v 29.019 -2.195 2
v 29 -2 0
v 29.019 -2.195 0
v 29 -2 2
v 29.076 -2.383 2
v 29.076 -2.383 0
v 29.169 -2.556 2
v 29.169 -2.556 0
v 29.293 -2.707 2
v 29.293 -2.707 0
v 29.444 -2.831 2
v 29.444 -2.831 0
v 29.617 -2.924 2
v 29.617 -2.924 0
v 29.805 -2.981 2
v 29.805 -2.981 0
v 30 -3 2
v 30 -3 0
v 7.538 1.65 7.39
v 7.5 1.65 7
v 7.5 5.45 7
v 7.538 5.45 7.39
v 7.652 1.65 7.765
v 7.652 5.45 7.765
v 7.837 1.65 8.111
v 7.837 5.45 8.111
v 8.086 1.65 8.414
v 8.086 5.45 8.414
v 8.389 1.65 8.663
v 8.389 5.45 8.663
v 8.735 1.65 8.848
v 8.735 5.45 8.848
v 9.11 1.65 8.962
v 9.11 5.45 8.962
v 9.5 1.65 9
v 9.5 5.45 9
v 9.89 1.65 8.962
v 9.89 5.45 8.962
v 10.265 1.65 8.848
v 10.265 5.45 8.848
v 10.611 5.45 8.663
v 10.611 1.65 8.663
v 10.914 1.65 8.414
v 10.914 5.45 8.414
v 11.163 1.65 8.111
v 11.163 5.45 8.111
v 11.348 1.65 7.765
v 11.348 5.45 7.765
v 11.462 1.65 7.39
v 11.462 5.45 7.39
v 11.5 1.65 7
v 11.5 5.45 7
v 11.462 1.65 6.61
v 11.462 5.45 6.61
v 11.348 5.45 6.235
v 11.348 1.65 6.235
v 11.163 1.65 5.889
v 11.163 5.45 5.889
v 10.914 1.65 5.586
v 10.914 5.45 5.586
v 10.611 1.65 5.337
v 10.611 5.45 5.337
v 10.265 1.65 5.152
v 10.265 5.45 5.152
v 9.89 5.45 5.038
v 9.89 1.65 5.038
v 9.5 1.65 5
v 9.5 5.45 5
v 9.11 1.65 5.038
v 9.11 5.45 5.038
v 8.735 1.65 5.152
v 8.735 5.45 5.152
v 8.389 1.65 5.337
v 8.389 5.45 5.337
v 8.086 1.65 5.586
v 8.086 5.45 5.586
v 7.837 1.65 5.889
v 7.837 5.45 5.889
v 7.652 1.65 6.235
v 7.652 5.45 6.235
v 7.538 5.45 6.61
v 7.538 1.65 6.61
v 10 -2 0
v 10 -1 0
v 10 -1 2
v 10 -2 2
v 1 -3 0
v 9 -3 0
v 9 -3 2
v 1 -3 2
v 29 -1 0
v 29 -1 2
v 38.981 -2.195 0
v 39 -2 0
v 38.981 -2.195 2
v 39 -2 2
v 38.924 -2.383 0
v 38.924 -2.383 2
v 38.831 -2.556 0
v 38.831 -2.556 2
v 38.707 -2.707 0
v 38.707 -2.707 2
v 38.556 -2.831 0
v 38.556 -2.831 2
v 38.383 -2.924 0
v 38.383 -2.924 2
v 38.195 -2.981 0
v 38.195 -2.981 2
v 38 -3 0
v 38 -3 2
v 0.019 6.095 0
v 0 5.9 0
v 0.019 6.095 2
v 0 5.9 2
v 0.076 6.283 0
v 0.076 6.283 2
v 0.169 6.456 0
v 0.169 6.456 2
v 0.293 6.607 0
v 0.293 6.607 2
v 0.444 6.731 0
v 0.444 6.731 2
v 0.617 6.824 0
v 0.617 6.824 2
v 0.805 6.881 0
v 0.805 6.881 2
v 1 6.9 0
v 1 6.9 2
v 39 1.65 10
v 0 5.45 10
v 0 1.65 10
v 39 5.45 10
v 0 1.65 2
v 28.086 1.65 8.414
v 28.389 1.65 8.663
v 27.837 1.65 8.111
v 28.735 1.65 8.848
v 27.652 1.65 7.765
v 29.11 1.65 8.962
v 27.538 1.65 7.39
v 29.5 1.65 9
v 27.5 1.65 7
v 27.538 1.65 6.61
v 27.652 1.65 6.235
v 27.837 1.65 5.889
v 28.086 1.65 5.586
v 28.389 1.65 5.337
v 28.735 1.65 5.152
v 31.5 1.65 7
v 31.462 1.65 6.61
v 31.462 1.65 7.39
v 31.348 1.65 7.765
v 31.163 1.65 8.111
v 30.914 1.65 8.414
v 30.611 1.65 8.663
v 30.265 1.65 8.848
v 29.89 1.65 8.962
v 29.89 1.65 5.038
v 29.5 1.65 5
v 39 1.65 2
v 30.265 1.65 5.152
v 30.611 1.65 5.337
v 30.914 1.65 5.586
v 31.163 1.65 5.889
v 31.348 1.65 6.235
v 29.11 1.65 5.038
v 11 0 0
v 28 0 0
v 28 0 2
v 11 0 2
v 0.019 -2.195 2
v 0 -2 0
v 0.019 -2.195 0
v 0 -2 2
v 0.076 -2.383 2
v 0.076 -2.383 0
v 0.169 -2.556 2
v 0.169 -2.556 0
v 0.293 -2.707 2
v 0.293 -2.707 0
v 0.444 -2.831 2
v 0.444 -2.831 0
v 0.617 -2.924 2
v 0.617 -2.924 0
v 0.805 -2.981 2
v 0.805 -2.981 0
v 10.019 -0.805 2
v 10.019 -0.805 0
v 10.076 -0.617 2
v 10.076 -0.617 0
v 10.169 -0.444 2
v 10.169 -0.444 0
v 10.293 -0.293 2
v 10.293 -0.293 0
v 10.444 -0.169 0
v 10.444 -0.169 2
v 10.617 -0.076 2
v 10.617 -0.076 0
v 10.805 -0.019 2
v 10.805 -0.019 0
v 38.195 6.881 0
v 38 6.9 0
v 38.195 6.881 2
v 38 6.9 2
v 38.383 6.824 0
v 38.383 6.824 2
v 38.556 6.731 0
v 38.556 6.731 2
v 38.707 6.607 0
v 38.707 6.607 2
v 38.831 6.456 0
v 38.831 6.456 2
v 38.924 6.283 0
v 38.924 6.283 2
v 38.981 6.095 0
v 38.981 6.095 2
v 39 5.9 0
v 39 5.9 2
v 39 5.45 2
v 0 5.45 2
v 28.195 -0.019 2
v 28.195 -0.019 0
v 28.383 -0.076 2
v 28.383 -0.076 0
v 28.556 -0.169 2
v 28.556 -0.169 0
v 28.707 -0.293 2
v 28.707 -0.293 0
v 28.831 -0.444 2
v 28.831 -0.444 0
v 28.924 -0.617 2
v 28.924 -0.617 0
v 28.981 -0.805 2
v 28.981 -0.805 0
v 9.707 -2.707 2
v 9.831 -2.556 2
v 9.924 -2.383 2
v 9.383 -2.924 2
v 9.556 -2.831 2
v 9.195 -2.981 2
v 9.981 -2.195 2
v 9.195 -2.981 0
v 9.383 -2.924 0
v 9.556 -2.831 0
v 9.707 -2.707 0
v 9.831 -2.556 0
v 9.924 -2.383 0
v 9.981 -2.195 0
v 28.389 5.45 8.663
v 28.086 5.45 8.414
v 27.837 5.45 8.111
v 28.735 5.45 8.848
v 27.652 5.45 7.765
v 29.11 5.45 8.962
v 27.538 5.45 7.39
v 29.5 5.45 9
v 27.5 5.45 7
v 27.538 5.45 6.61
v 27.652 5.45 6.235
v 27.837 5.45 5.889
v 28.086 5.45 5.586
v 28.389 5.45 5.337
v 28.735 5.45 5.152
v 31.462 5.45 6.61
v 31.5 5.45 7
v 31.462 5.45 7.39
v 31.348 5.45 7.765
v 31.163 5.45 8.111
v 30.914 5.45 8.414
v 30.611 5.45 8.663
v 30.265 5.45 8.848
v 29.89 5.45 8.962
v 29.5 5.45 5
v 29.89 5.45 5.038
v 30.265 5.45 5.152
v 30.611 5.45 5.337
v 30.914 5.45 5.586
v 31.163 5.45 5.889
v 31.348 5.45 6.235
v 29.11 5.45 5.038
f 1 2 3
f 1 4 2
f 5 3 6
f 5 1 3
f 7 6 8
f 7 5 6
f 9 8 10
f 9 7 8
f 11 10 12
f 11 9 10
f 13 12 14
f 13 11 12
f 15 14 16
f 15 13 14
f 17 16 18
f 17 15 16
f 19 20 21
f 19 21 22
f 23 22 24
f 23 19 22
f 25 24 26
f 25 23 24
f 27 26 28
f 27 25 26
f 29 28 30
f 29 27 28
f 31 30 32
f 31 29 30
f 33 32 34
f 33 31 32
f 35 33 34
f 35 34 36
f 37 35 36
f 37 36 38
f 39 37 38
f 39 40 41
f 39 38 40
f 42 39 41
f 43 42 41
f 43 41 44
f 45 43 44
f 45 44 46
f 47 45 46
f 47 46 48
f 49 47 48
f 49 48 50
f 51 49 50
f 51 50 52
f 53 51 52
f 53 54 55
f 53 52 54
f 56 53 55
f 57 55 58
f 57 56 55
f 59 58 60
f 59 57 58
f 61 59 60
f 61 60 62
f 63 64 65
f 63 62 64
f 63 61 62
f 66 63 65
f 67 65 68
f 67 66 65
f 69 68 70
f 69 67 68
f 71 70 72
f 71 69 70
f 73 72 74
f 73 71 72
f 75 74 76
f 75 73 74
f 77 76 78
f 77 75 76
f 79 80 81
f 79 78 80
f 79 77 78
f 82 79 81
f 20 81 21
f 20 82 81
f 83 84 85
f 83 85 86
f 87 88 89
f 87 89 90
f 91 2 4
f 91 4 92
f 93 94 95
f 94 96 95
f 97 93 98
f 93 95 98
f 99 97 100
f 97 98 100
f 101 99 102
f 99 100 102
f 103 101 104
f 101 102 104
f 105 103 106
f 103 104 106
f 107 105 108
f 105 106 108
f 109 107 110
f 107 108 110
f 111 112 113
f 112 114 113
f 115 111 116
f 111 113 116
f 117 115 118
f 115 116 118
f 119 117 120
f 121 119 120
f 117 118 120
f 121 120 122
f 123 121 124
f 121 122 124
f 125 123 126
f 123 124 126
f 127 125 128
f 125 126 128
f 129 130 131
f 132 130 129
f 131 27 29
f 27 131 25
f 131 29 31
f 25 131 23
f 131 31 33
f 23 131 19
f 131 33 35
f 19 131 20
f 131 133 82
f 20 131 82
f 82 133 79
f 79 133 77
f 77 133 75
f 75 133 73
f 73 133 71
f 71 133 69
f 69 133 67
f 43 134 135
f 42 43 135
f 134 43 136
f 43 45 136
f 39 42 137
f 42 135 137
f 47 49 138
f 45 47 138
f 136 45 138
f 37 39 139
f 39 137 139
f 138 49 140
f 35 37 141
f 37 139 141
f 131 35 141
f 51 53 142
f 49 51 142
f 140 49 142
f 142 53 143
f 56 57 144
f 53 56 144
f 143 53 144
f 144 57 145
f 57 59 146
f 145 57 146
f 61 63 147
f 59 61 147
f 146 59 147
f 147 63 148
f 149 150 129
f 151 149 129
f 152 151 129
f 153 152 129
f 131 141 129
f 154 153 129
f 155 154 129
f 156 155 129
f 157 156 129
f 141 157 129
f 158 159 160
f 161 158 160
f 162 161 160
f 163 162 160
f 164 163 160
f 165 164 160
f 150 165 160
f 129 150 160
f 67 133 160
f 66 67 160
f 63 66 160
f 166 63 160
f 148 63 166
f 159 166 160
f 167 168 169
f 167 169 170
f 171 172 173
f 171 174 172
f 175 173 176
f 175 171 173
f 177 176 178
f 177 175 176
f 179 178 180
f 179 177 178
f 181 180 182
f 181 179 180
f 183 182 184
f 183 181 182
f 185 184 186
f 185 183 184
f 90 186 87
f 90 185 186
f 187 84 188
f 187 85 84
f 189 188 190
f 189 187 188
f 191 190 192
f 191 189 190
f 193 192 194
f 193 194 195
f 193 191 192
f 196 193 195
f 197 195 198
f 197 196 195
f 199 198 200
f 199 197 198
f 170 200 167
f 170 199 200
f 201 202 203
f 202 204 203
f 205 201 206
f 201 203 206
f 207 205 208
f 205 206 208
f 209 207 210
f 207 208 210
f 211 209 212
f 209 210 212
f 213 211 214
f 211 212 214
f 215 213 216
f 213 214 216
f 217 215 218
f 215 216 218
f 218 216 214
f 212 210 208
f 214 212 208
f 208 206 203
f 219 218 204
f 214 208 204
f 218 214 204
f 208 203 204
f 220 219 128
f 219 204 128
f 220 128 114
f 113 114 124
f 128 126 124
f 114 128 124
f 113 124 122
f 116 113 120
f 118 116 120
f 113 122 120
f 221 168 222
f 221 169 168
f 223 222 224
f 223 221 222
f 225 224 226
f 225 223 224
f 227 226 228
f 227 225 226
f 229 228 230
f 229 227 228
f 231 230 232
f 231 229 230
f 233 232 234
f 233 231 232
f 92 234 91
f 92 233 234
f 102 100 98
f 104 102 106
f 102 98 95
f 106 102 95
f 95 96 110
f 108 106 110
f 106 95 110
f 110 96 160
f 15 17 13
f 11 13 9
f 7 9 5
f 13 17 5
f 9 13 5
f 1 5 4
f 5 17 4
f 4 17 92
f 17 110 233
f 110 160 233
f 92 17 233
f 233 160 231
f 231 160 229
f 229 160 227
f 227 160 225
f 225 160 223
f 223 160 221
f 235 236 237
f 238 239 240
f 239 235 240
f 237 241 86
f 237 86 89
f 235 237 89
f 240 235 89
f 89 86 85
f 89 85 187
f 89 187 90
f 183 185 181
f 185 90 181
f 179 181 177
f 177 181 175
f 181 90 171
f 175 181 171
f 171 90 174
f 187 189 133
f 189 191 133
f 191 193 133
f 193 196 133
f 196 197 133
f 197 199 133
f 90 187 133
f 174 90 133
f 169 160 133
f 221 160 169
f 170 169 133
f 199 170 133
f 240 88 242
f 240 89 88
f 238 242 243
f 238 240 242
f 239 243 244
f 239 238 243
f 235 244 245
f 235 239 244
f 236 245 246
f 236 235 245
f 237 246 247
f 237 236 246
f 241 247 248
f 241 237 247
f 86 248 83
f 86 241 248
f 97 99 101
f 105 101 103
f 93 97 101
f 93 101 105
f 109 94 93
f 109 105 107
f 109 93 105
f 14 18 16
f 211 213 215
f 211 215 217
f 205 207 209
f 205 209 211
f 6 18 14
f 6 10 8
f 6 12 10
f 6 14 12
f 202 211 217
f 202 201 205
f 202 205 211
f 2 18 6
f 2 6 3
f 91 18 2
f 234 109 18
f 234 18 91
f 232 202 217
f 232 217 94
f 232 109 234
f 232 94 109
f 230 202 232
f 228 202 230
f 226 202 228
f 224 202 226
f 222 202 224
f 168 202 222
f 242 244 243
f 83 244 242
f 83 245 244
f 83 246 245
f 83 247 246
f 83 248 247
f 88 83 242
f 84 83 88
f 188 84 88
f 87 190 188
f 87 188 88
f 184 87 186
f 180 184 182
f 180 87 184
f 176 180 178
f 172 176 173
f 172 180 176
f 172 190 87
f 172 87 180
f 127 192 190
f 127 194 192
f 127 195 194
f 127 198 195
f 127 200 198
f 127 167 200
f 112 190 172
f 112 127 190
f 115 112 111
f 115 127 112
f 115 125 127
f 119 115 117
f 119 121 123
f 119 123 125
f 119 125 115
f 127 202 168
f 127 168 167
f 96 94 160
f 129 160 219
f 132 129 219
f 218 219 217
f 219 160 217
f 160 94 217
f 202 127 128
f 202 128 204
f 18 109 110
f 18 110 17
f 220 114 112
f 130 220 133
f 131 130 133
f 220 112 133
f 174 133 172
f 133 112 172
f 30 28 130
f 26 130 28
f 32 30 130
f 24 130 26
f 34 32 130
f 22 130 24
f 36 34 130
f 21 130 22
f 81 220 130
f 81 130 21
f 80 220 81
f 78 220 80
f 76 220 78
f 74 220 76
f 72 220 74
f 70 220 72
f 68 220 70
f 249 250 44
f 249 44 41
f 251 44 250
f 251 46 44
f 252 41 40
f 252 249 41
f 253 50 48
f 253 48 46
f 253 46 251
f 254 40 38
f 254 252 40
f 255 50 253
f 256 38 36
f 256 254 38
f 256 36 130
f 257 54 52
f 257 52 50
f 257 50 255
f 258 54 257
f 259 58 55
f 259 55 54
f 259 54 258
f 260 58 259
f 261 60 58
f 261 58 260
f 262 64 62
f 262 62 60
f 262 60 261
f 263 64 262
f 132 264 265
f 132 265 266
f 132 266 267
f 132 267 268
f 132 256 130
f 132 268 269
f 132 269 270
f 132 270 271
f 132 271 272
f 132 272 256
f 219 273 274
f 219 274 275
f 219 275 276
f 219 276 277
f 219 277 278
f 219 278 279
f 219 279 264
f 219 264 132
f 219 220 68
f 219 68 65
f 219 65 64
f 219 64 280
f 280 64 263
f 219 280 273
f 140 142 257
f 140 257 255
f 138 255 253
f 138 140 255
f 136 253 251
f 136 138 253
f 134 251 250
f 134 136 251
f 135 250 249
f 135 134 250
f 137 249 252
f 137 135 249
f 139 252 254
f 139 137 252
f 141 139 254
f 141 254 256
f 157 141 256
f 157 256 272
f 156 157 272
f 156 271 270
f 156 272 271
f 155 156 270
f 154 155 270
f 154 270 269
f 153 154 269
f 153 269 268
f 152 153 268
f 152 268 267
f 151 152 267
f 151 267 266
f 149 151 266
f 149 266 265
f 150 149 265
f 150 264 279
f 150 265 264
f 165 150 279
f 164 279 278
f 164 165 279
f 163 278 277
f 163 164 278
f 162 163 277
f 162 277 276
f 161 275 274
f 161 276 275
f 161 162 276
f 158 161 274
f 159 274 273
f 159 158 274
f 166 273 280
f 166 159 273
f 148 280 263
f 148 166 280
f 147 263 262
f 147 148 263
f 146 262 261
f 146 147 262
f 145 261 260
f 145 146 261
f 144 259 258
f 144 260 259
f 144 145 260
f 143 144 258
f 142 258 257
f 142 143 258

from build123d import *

# Parameters (mm, degrees)
BOSS_EXTRU_1_DEPTH           = 2
ESQUISSE2_W                  = 39
ESQUISSE2_H                  = 3.8
BOSS_EXTRU_2_DEPTH           = 8
ENL_V_MAT_EXTRU_1_DEPTH      = 41.602493766
ENL_V_MAT_EXTRU_1_DEPTH_BACK = 41.602493766
ESQUISSE3_R                  = 2
CONG_1_R                     = 1


with BuildPart() as part:
    # Esquisse1 → Boss.-Extru.1 (new body)
    with BuildSketch(Plane.XY):
        Polygon((0, 0), (0, 6.9), (39, 6.9), (39, 0), (39, -3), (29, -3), (29, 0), (10, 0), (10, -3), (0, -3), align=None)
    extrude(amount=BOSS_EXTRU_1_DEPTH)

    # Esquisse2 → Boss.-Extru.2 (add)
    with BuildSketch(Plane.XY.offset(2)):
        with Locations((19.5, 3.55)):
            Rectangle(ESQUISSE2_W, ESQUISSE2_H)
    extrude(amount=BOSS_EXTRU_2_DEPTH)

    # Esquisse3 → Enlèv. mat.-Extru.1 (cut, two sides: drawn at the far end of the back side and taken through both)
    with BuildSketch(Plane(origin=(0, 1.65, 0), x_dir=(1, 0, 0), z_dir=(0, 1, 0)).offset(-ENL_V_MAT_EXTRU_1_DEPTH_BACK)):
        with Locations(Location((9.5, -7, 0), (0, 0, 180))):
            Circle(ESQUISSE3_R)
        with Locations(Location((29.5, -7, 0), (0, 0, 180))):
            Circle(ESQUISSE3_R)
    extrude(amount=ENL_V_MAT_EXTRU_1_DEPTH + ENL_V_MAT_EXTRU_1_DEPTH_BACK, mode=Mode.SUBTRACT)

    # Congé1
    cong_1_edges = [part.edges().sort_by_distance(p)[0] for p in [
        (0, 6.9, 1),
        (39, 6.9, 1),
        (39, -3, 1),
        (29, -3, 1),
        (29, 0, 1),
        (10, 0, 1),
        (10, -3, 1),
        (0, -3, 1),
    ]]
    fillet(cong_1_edges, radius=CONG_1_R)


solid = part.part
